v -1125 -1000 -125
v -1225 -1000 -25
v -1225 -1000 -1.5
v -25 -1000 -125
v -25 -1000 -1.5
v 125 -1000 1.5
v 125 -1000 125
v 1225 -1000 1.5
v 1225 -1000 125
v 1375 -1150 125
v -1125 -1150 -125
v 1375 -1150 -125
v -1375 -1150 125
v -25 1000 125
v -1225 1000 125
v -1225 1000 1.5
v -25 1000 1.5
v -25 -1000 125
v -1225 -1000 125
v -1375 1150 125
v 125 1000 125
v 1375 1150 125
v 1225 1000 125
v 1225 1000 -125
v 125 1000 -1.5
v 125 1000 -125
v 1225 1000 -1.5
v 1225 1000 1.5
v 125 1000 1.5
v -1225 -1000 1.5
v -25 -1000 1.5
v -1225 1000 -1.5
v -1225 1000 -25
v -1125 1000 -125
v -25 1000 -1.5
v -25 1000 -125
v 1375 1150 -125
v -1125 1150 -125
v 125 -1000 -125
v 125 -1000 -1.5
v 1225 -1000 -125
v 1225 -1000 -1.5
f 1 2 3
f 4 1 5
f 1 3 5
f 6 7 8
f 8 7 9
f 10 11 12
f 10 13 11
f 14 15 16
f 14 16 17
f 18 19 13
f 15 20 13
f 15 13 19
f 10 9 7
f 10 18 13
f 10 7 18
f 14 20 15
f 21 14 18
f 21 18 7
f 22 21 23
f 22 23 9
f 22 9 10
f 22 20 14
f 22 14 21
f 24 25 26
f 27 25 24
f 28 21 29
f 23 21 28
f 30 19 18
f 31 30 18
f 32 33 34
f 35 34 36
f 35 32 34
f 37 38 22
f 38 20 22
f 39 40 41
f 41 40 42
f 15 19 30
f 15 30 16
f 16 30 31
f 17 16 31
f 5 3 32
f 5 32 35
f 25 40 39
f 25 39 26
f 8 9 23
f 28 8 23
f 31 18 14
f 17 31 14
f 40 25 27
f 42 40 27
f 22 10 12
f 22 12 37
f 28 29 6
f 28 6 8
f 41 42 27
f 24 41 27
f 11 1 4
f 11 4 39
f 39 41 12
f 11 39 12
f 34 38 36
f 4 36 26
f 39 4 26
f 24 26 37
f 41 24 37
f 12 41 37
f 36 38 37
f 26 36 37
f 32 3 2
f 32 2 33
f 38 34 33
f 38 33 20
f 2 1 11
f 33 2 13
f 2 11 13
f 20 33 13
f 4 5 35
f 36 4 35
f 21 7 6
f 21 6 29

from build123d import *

# Parameters (mm, degrees)
F0_W     = 2750
F0_H     = 2300
F0_W_2   = 1200
F0_H_2   = 2000
F0_W_3   = 1100
F1_DEPTH = 125
F2_W     = 1301.708862
F2_H     = 2201.619386
F2_W_2   = 1301.310276
F2_H_2   = 2202.914714
F3_DEPTH = 1.5
F5_DEPTH = 2300


with BuildPart() as f1:
    # F0 (on Top) → F1 (new body, symmetric)
    with BuildSketch(Plane.XY):
        Rectangle(F0_W, F0_H)
        with Locations((-625, 0)):
            Rectangle(F0_W_2, F0_H_2, mode=Mode.SUBTRACT)
        with Locations((675, 0)):
            Rectangle(F0_W_3, F0_H_2, mode=Mode.SUBTRACT)
    extrude(amount=F1_DEPTH, both=True)

    # F2 (on Top) → F3 (join, symmetric)
    with BuildSketch(Plane.XY):
        with Locations((674.405493, 2.383113)):
            Rectangle(F2_W, F2_H)
        with Locations((-675.495875, 3.030777)):
            Rectangle(F2_W_2, F2_H_2)
    extrude(amount=F3_DEPTH, both=True)

    # F4 (on face) → F5 (cut, through all)
    with BuildSketch(Plane.XZ.offset(1150)):
        Polygon((-1375, 125), (-1375, -125), (-1125, -125), align=None)
    extrude(amount=-F5_DEPTH, mode=Mode.SUBTRACT)


solid = f1.part
